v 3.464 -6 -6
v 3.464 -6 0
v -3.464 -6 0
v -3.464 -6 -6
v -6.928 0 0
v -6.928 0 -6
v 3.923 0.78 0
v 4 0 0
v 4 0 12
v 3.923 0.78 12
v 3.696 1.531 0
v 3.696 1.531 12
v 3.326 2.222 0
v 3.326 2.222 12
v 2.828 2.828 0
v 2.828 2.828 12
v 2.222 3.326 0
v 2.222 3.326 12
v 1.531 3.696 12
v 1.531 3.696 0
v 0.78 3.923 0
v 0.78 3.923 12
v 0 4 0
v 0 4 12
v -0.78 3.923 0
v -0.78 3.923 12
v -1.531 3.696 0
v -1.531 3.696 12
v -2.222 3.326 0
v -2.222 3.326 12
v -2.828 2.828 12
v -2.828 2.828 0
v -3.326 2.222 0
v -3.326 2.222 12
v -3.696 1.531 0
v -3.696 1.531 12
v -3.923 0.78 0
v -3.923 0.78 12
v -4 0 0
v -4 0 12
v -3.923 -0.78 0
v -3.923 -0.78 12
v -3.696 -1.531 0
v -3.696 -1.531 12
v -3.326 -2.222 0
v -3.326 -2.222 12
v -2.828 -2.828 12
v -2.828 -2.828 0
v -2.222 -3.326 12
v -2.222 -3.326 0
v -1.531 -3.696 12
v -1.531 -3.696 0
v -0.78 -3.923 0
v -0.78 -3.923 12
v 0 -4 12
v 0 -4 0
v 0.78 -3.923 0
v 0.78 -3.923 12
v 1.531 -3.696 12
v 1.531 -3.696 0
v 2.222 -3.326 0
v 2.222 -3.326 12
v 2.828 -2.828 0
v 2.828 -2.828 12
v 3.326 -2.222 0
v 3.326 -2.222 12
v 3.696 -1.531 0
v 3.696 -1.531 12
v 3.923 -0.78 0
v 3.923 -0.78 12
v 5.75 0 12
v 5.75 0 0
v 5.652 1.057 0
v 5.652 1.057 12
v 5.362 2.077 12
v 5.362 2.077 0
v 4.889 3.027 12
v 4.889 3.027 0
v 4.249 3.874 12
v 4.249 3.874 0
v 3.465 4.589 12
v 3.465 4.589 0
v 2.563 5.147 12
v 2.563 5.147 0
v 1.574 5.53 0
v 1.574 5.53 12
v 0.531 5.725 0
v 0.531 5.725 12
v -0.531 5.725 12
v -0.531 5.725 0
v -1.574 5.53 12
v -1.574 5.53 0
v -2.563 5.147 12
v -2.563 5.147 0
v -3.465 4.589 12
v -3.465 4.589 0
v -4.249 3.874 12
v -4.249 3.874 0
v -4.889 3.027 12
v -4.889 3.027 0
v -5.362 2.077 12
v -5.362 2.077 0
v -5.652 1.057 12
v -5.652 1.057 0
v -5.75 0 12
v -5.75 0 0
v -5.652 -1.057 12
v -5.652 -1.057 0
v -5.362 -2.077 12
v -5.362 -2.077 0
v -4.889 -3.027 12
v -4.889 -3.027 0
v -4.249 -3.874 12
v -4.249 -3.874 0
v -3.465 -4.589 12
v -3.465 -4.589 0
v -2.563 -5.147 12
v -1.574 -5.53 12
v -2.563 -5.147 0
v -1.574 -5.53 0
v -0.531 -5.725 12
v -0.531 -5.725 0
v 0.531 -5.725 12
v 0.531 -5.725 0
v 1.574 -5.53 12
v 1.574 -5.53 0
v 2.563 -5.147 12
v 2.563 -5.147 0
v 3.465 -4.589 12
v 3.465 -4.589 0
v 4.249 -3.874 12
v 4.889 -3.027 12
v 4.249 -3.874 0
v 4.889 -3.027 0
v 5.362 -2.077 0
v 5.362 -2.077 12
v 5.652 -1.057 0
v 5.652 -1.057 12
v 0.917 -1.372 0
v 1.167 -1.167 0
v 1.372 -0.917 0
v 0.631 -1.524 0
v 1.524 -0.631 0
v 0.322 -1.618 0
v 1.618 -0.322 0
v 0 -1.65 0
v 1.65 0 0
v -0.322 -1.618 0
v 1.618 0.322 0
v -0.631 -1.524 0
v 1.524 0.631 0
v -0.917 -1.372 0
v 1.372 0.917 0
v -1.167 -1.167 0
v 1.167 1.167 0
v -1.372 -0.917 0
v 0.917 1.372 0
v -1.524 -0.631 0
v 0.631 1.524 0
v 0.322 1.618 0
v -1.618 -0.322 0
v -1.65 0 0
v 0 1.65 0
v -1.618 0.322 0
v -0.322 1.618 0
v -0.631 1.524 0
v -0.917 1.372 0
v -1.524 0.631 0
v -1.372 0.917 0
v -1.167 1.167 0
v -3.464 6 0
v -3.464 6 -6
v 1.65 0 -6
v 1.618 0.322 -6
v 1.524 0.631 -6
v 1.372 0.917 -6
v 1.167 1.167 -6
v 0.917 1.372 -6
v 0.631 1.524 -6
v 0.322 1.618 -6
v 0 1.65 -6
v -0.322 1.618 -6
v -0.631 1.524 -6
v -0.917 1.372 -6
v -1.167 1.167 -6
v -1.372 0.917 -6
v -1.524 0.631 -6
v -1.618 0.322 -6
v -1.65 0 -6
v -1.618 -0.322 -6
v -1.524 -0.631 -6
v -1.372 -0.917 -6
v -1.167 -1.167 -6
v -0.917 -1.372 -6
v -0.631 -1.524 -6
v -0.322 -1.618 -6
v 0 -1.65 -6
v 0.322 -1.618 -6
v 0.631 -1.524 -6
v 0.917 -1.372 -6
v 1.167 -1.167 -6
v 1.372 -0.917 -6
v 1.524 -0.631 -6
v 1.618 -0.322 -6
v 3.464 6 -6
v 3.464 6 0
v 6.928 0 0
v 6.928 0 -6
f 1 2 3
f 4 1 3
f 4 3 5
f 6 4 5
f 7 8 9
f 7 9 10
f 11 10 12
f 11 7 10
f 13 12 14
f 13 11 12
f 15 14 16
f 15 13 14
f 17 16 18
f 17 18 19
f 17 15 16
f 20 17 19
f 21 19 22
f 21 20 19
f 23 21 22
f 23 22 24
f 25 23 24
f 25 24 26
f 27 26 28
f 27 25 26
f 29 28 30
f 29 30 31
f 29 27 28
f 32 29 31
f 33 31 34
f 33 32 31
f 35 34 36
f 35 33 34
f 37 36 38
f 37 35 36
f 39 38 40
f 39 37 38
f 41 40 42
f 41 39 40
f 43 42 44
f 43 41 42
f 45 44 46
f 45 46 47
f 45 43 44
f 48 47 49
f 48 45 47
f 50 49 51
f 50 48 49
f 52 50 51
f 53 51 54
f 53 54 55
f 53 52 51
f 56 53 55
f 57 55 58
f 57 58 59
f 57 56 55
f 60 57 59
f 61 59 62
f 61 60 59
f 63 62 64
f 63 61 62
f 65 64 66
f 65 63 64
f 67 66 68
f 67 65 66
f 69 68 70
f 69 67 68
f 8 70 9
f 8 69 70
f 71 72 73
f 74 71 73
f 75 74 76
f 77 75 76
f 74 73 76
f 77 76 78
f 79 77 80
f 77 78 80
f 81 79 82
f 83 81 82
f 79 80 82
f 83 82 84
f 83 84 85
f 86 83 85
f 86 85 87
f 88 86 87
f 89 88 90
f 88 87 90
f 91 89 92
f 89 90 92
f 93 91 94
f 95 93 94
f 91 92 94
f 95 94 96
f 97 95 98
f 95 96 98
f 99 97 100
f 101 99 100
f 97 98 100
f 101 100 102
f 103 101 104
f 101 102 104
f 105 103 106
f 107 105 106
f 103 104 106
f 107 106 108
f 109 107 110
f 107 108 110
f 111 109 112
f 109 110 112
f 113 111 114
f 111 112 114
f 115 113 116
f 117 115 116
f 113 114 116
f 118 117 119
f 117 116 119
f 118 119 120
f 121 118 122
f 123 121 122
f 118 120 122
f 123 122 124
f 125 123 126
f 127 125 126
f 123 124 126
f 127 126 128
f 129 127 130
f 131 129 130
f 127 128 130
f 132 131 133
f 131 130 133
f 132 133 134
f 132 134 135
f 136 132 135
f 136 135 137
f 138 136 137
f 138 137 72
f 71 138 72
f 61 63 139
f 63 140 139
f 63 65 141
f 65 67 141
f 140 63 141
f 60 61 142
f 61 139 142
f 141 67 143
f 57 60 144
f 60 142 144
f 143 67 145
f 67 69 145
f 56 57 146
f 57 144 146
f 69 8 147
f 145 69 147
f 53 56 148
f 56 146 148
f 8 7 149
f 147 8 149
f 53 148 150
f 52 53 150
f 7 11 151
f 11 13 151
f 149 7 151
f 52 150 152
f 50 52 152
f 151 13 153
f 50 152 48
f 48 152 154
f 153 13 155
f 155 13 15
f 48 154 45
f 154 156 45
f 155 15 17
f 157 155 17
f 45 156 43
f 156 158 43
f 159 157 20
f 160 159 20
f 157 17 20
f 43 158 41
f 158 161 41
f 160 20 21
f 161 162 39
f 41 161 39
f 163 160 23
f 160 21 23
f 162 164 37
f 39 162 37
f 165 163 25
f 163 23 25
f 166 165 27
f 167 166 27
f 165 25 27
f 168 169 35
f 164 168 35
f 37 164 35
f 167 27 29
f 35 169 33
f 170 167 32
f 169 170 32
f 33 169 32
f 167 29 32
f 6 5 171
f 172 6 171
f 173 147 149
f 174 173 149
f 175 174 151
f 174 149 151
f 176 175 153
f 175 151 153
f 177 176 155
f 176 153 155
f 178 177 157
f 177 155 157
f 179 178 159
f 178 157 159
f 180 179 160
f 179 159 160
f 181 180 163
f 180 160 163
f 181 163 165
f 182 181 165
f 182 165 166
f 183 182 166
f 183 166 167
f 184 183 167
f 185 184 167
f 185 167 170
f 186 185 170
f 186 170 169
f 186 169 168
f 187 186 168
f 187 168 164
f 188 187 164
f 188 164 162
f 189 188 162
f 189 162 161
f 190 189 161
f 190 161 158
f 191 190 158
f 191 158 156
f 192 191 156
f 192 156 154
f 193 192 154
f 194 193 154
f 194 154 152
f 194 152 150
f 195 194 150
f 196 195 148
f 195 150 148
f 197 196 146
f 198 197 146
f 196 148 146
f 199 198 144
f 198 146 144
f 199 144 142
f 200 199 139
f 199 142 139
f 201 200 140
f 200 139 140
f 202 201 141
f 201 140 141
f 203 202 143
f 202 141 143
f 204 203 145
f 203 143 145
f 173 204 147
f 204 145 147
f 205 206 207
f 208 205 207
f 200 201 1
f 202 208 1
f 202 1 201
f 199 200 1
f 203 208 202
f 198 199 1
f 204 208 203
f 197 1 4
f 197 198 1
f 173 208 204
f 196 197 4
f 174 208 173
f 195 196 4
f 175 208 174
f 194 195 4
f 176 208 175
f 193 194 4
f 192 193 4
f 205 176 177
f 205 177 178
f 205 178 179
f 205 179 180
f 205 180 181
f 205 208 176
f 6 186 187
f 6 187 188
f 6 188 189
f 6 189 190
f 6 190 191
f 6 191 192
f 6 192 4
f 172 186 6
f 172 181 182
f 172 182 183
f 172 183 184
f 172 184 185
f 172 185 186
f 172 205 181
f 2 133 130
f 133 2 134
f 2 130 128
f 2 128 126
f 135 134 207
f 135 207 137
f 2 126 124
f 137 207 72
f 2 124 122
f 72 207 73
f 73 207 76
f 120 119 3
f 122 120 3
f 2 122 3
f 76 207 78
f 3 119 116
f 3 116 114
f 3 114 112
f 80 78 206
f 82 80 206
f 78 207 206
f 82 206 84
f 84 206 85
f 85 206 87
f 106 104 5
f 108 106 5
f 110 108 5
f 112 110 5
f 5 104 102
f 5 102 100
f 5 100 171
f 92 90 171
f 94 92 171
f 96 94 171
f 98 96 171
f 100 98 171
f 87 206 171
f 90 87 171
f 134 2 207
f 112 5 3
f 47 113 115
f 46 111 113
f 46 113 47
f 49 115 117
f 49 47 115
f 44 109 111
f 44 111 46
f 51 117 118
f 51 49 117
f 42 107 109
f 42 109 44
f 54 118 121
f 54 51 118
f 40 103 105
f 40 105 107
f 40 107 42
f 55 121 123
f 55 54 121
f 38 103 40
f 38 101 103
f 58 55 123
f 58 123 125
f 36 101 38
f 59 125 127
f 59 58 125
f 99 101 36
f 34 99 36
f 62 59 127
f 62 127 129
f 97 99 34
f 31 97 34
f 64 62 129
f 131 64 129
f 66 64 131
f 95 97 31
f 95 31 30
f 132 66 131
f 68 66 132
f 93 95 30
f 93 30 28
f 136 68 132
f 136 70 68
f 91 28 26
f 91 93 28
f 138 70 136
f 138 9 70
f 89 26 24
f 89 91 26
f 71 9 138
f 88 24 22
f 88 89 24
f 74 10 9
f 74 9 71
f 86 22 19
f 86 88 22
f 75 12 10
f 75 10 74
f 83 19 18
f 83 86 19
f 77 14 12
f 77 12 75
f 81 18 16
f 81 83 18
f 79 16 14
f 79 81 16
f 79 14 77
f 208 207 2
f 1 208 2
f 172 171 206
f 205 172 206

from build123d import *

# Parameters (mm, degrees)
SKETCH2_R             = 5.75
SKETCH2_R_2           = 4
BOSS_EXTRUDE1_DEPTH   = 12
BOSS_EXTRUDE2_DEPTH   = 6
M4X0_7_TAPPED_HOLE1_D = 3.3


with BuildPart() as part:
    # Sketch2 → Boss-Extrude1 (new body)
    with BuildSketch(Plane.XY):
        Circle(SKETCH2_R)
        Circle(SKETCH2_R_2, mode=Mode.SUBTRACT)
    extrude(amount=BOSS_EXTRUDE1_DEPTH)

    # Sketch3 → Boss-Extrude2 (add)
    with BuildSketch(Plane.XY):
        Polygon((-6.92820323, 0), (-3.464101615, 6), (3.464101615, 6), (6.92820323, 0), (3.464101615, -6), (-3.464101615, -6), align=None)
    extrude(amount=-BOSS_EXTRUDE2_DEPTH)

    # M4x0.7 Tapped Hole1 (through all)
    with Locations(Plane(origin=(0, 0, -6), x_dir=(-1, 0, 0), z_dir=(0, 0, -1))):
        with Locations((0, 0)):
            Hole(M4X0_7_TAPPED_HOLE1_D / 2)


solid = part.part
